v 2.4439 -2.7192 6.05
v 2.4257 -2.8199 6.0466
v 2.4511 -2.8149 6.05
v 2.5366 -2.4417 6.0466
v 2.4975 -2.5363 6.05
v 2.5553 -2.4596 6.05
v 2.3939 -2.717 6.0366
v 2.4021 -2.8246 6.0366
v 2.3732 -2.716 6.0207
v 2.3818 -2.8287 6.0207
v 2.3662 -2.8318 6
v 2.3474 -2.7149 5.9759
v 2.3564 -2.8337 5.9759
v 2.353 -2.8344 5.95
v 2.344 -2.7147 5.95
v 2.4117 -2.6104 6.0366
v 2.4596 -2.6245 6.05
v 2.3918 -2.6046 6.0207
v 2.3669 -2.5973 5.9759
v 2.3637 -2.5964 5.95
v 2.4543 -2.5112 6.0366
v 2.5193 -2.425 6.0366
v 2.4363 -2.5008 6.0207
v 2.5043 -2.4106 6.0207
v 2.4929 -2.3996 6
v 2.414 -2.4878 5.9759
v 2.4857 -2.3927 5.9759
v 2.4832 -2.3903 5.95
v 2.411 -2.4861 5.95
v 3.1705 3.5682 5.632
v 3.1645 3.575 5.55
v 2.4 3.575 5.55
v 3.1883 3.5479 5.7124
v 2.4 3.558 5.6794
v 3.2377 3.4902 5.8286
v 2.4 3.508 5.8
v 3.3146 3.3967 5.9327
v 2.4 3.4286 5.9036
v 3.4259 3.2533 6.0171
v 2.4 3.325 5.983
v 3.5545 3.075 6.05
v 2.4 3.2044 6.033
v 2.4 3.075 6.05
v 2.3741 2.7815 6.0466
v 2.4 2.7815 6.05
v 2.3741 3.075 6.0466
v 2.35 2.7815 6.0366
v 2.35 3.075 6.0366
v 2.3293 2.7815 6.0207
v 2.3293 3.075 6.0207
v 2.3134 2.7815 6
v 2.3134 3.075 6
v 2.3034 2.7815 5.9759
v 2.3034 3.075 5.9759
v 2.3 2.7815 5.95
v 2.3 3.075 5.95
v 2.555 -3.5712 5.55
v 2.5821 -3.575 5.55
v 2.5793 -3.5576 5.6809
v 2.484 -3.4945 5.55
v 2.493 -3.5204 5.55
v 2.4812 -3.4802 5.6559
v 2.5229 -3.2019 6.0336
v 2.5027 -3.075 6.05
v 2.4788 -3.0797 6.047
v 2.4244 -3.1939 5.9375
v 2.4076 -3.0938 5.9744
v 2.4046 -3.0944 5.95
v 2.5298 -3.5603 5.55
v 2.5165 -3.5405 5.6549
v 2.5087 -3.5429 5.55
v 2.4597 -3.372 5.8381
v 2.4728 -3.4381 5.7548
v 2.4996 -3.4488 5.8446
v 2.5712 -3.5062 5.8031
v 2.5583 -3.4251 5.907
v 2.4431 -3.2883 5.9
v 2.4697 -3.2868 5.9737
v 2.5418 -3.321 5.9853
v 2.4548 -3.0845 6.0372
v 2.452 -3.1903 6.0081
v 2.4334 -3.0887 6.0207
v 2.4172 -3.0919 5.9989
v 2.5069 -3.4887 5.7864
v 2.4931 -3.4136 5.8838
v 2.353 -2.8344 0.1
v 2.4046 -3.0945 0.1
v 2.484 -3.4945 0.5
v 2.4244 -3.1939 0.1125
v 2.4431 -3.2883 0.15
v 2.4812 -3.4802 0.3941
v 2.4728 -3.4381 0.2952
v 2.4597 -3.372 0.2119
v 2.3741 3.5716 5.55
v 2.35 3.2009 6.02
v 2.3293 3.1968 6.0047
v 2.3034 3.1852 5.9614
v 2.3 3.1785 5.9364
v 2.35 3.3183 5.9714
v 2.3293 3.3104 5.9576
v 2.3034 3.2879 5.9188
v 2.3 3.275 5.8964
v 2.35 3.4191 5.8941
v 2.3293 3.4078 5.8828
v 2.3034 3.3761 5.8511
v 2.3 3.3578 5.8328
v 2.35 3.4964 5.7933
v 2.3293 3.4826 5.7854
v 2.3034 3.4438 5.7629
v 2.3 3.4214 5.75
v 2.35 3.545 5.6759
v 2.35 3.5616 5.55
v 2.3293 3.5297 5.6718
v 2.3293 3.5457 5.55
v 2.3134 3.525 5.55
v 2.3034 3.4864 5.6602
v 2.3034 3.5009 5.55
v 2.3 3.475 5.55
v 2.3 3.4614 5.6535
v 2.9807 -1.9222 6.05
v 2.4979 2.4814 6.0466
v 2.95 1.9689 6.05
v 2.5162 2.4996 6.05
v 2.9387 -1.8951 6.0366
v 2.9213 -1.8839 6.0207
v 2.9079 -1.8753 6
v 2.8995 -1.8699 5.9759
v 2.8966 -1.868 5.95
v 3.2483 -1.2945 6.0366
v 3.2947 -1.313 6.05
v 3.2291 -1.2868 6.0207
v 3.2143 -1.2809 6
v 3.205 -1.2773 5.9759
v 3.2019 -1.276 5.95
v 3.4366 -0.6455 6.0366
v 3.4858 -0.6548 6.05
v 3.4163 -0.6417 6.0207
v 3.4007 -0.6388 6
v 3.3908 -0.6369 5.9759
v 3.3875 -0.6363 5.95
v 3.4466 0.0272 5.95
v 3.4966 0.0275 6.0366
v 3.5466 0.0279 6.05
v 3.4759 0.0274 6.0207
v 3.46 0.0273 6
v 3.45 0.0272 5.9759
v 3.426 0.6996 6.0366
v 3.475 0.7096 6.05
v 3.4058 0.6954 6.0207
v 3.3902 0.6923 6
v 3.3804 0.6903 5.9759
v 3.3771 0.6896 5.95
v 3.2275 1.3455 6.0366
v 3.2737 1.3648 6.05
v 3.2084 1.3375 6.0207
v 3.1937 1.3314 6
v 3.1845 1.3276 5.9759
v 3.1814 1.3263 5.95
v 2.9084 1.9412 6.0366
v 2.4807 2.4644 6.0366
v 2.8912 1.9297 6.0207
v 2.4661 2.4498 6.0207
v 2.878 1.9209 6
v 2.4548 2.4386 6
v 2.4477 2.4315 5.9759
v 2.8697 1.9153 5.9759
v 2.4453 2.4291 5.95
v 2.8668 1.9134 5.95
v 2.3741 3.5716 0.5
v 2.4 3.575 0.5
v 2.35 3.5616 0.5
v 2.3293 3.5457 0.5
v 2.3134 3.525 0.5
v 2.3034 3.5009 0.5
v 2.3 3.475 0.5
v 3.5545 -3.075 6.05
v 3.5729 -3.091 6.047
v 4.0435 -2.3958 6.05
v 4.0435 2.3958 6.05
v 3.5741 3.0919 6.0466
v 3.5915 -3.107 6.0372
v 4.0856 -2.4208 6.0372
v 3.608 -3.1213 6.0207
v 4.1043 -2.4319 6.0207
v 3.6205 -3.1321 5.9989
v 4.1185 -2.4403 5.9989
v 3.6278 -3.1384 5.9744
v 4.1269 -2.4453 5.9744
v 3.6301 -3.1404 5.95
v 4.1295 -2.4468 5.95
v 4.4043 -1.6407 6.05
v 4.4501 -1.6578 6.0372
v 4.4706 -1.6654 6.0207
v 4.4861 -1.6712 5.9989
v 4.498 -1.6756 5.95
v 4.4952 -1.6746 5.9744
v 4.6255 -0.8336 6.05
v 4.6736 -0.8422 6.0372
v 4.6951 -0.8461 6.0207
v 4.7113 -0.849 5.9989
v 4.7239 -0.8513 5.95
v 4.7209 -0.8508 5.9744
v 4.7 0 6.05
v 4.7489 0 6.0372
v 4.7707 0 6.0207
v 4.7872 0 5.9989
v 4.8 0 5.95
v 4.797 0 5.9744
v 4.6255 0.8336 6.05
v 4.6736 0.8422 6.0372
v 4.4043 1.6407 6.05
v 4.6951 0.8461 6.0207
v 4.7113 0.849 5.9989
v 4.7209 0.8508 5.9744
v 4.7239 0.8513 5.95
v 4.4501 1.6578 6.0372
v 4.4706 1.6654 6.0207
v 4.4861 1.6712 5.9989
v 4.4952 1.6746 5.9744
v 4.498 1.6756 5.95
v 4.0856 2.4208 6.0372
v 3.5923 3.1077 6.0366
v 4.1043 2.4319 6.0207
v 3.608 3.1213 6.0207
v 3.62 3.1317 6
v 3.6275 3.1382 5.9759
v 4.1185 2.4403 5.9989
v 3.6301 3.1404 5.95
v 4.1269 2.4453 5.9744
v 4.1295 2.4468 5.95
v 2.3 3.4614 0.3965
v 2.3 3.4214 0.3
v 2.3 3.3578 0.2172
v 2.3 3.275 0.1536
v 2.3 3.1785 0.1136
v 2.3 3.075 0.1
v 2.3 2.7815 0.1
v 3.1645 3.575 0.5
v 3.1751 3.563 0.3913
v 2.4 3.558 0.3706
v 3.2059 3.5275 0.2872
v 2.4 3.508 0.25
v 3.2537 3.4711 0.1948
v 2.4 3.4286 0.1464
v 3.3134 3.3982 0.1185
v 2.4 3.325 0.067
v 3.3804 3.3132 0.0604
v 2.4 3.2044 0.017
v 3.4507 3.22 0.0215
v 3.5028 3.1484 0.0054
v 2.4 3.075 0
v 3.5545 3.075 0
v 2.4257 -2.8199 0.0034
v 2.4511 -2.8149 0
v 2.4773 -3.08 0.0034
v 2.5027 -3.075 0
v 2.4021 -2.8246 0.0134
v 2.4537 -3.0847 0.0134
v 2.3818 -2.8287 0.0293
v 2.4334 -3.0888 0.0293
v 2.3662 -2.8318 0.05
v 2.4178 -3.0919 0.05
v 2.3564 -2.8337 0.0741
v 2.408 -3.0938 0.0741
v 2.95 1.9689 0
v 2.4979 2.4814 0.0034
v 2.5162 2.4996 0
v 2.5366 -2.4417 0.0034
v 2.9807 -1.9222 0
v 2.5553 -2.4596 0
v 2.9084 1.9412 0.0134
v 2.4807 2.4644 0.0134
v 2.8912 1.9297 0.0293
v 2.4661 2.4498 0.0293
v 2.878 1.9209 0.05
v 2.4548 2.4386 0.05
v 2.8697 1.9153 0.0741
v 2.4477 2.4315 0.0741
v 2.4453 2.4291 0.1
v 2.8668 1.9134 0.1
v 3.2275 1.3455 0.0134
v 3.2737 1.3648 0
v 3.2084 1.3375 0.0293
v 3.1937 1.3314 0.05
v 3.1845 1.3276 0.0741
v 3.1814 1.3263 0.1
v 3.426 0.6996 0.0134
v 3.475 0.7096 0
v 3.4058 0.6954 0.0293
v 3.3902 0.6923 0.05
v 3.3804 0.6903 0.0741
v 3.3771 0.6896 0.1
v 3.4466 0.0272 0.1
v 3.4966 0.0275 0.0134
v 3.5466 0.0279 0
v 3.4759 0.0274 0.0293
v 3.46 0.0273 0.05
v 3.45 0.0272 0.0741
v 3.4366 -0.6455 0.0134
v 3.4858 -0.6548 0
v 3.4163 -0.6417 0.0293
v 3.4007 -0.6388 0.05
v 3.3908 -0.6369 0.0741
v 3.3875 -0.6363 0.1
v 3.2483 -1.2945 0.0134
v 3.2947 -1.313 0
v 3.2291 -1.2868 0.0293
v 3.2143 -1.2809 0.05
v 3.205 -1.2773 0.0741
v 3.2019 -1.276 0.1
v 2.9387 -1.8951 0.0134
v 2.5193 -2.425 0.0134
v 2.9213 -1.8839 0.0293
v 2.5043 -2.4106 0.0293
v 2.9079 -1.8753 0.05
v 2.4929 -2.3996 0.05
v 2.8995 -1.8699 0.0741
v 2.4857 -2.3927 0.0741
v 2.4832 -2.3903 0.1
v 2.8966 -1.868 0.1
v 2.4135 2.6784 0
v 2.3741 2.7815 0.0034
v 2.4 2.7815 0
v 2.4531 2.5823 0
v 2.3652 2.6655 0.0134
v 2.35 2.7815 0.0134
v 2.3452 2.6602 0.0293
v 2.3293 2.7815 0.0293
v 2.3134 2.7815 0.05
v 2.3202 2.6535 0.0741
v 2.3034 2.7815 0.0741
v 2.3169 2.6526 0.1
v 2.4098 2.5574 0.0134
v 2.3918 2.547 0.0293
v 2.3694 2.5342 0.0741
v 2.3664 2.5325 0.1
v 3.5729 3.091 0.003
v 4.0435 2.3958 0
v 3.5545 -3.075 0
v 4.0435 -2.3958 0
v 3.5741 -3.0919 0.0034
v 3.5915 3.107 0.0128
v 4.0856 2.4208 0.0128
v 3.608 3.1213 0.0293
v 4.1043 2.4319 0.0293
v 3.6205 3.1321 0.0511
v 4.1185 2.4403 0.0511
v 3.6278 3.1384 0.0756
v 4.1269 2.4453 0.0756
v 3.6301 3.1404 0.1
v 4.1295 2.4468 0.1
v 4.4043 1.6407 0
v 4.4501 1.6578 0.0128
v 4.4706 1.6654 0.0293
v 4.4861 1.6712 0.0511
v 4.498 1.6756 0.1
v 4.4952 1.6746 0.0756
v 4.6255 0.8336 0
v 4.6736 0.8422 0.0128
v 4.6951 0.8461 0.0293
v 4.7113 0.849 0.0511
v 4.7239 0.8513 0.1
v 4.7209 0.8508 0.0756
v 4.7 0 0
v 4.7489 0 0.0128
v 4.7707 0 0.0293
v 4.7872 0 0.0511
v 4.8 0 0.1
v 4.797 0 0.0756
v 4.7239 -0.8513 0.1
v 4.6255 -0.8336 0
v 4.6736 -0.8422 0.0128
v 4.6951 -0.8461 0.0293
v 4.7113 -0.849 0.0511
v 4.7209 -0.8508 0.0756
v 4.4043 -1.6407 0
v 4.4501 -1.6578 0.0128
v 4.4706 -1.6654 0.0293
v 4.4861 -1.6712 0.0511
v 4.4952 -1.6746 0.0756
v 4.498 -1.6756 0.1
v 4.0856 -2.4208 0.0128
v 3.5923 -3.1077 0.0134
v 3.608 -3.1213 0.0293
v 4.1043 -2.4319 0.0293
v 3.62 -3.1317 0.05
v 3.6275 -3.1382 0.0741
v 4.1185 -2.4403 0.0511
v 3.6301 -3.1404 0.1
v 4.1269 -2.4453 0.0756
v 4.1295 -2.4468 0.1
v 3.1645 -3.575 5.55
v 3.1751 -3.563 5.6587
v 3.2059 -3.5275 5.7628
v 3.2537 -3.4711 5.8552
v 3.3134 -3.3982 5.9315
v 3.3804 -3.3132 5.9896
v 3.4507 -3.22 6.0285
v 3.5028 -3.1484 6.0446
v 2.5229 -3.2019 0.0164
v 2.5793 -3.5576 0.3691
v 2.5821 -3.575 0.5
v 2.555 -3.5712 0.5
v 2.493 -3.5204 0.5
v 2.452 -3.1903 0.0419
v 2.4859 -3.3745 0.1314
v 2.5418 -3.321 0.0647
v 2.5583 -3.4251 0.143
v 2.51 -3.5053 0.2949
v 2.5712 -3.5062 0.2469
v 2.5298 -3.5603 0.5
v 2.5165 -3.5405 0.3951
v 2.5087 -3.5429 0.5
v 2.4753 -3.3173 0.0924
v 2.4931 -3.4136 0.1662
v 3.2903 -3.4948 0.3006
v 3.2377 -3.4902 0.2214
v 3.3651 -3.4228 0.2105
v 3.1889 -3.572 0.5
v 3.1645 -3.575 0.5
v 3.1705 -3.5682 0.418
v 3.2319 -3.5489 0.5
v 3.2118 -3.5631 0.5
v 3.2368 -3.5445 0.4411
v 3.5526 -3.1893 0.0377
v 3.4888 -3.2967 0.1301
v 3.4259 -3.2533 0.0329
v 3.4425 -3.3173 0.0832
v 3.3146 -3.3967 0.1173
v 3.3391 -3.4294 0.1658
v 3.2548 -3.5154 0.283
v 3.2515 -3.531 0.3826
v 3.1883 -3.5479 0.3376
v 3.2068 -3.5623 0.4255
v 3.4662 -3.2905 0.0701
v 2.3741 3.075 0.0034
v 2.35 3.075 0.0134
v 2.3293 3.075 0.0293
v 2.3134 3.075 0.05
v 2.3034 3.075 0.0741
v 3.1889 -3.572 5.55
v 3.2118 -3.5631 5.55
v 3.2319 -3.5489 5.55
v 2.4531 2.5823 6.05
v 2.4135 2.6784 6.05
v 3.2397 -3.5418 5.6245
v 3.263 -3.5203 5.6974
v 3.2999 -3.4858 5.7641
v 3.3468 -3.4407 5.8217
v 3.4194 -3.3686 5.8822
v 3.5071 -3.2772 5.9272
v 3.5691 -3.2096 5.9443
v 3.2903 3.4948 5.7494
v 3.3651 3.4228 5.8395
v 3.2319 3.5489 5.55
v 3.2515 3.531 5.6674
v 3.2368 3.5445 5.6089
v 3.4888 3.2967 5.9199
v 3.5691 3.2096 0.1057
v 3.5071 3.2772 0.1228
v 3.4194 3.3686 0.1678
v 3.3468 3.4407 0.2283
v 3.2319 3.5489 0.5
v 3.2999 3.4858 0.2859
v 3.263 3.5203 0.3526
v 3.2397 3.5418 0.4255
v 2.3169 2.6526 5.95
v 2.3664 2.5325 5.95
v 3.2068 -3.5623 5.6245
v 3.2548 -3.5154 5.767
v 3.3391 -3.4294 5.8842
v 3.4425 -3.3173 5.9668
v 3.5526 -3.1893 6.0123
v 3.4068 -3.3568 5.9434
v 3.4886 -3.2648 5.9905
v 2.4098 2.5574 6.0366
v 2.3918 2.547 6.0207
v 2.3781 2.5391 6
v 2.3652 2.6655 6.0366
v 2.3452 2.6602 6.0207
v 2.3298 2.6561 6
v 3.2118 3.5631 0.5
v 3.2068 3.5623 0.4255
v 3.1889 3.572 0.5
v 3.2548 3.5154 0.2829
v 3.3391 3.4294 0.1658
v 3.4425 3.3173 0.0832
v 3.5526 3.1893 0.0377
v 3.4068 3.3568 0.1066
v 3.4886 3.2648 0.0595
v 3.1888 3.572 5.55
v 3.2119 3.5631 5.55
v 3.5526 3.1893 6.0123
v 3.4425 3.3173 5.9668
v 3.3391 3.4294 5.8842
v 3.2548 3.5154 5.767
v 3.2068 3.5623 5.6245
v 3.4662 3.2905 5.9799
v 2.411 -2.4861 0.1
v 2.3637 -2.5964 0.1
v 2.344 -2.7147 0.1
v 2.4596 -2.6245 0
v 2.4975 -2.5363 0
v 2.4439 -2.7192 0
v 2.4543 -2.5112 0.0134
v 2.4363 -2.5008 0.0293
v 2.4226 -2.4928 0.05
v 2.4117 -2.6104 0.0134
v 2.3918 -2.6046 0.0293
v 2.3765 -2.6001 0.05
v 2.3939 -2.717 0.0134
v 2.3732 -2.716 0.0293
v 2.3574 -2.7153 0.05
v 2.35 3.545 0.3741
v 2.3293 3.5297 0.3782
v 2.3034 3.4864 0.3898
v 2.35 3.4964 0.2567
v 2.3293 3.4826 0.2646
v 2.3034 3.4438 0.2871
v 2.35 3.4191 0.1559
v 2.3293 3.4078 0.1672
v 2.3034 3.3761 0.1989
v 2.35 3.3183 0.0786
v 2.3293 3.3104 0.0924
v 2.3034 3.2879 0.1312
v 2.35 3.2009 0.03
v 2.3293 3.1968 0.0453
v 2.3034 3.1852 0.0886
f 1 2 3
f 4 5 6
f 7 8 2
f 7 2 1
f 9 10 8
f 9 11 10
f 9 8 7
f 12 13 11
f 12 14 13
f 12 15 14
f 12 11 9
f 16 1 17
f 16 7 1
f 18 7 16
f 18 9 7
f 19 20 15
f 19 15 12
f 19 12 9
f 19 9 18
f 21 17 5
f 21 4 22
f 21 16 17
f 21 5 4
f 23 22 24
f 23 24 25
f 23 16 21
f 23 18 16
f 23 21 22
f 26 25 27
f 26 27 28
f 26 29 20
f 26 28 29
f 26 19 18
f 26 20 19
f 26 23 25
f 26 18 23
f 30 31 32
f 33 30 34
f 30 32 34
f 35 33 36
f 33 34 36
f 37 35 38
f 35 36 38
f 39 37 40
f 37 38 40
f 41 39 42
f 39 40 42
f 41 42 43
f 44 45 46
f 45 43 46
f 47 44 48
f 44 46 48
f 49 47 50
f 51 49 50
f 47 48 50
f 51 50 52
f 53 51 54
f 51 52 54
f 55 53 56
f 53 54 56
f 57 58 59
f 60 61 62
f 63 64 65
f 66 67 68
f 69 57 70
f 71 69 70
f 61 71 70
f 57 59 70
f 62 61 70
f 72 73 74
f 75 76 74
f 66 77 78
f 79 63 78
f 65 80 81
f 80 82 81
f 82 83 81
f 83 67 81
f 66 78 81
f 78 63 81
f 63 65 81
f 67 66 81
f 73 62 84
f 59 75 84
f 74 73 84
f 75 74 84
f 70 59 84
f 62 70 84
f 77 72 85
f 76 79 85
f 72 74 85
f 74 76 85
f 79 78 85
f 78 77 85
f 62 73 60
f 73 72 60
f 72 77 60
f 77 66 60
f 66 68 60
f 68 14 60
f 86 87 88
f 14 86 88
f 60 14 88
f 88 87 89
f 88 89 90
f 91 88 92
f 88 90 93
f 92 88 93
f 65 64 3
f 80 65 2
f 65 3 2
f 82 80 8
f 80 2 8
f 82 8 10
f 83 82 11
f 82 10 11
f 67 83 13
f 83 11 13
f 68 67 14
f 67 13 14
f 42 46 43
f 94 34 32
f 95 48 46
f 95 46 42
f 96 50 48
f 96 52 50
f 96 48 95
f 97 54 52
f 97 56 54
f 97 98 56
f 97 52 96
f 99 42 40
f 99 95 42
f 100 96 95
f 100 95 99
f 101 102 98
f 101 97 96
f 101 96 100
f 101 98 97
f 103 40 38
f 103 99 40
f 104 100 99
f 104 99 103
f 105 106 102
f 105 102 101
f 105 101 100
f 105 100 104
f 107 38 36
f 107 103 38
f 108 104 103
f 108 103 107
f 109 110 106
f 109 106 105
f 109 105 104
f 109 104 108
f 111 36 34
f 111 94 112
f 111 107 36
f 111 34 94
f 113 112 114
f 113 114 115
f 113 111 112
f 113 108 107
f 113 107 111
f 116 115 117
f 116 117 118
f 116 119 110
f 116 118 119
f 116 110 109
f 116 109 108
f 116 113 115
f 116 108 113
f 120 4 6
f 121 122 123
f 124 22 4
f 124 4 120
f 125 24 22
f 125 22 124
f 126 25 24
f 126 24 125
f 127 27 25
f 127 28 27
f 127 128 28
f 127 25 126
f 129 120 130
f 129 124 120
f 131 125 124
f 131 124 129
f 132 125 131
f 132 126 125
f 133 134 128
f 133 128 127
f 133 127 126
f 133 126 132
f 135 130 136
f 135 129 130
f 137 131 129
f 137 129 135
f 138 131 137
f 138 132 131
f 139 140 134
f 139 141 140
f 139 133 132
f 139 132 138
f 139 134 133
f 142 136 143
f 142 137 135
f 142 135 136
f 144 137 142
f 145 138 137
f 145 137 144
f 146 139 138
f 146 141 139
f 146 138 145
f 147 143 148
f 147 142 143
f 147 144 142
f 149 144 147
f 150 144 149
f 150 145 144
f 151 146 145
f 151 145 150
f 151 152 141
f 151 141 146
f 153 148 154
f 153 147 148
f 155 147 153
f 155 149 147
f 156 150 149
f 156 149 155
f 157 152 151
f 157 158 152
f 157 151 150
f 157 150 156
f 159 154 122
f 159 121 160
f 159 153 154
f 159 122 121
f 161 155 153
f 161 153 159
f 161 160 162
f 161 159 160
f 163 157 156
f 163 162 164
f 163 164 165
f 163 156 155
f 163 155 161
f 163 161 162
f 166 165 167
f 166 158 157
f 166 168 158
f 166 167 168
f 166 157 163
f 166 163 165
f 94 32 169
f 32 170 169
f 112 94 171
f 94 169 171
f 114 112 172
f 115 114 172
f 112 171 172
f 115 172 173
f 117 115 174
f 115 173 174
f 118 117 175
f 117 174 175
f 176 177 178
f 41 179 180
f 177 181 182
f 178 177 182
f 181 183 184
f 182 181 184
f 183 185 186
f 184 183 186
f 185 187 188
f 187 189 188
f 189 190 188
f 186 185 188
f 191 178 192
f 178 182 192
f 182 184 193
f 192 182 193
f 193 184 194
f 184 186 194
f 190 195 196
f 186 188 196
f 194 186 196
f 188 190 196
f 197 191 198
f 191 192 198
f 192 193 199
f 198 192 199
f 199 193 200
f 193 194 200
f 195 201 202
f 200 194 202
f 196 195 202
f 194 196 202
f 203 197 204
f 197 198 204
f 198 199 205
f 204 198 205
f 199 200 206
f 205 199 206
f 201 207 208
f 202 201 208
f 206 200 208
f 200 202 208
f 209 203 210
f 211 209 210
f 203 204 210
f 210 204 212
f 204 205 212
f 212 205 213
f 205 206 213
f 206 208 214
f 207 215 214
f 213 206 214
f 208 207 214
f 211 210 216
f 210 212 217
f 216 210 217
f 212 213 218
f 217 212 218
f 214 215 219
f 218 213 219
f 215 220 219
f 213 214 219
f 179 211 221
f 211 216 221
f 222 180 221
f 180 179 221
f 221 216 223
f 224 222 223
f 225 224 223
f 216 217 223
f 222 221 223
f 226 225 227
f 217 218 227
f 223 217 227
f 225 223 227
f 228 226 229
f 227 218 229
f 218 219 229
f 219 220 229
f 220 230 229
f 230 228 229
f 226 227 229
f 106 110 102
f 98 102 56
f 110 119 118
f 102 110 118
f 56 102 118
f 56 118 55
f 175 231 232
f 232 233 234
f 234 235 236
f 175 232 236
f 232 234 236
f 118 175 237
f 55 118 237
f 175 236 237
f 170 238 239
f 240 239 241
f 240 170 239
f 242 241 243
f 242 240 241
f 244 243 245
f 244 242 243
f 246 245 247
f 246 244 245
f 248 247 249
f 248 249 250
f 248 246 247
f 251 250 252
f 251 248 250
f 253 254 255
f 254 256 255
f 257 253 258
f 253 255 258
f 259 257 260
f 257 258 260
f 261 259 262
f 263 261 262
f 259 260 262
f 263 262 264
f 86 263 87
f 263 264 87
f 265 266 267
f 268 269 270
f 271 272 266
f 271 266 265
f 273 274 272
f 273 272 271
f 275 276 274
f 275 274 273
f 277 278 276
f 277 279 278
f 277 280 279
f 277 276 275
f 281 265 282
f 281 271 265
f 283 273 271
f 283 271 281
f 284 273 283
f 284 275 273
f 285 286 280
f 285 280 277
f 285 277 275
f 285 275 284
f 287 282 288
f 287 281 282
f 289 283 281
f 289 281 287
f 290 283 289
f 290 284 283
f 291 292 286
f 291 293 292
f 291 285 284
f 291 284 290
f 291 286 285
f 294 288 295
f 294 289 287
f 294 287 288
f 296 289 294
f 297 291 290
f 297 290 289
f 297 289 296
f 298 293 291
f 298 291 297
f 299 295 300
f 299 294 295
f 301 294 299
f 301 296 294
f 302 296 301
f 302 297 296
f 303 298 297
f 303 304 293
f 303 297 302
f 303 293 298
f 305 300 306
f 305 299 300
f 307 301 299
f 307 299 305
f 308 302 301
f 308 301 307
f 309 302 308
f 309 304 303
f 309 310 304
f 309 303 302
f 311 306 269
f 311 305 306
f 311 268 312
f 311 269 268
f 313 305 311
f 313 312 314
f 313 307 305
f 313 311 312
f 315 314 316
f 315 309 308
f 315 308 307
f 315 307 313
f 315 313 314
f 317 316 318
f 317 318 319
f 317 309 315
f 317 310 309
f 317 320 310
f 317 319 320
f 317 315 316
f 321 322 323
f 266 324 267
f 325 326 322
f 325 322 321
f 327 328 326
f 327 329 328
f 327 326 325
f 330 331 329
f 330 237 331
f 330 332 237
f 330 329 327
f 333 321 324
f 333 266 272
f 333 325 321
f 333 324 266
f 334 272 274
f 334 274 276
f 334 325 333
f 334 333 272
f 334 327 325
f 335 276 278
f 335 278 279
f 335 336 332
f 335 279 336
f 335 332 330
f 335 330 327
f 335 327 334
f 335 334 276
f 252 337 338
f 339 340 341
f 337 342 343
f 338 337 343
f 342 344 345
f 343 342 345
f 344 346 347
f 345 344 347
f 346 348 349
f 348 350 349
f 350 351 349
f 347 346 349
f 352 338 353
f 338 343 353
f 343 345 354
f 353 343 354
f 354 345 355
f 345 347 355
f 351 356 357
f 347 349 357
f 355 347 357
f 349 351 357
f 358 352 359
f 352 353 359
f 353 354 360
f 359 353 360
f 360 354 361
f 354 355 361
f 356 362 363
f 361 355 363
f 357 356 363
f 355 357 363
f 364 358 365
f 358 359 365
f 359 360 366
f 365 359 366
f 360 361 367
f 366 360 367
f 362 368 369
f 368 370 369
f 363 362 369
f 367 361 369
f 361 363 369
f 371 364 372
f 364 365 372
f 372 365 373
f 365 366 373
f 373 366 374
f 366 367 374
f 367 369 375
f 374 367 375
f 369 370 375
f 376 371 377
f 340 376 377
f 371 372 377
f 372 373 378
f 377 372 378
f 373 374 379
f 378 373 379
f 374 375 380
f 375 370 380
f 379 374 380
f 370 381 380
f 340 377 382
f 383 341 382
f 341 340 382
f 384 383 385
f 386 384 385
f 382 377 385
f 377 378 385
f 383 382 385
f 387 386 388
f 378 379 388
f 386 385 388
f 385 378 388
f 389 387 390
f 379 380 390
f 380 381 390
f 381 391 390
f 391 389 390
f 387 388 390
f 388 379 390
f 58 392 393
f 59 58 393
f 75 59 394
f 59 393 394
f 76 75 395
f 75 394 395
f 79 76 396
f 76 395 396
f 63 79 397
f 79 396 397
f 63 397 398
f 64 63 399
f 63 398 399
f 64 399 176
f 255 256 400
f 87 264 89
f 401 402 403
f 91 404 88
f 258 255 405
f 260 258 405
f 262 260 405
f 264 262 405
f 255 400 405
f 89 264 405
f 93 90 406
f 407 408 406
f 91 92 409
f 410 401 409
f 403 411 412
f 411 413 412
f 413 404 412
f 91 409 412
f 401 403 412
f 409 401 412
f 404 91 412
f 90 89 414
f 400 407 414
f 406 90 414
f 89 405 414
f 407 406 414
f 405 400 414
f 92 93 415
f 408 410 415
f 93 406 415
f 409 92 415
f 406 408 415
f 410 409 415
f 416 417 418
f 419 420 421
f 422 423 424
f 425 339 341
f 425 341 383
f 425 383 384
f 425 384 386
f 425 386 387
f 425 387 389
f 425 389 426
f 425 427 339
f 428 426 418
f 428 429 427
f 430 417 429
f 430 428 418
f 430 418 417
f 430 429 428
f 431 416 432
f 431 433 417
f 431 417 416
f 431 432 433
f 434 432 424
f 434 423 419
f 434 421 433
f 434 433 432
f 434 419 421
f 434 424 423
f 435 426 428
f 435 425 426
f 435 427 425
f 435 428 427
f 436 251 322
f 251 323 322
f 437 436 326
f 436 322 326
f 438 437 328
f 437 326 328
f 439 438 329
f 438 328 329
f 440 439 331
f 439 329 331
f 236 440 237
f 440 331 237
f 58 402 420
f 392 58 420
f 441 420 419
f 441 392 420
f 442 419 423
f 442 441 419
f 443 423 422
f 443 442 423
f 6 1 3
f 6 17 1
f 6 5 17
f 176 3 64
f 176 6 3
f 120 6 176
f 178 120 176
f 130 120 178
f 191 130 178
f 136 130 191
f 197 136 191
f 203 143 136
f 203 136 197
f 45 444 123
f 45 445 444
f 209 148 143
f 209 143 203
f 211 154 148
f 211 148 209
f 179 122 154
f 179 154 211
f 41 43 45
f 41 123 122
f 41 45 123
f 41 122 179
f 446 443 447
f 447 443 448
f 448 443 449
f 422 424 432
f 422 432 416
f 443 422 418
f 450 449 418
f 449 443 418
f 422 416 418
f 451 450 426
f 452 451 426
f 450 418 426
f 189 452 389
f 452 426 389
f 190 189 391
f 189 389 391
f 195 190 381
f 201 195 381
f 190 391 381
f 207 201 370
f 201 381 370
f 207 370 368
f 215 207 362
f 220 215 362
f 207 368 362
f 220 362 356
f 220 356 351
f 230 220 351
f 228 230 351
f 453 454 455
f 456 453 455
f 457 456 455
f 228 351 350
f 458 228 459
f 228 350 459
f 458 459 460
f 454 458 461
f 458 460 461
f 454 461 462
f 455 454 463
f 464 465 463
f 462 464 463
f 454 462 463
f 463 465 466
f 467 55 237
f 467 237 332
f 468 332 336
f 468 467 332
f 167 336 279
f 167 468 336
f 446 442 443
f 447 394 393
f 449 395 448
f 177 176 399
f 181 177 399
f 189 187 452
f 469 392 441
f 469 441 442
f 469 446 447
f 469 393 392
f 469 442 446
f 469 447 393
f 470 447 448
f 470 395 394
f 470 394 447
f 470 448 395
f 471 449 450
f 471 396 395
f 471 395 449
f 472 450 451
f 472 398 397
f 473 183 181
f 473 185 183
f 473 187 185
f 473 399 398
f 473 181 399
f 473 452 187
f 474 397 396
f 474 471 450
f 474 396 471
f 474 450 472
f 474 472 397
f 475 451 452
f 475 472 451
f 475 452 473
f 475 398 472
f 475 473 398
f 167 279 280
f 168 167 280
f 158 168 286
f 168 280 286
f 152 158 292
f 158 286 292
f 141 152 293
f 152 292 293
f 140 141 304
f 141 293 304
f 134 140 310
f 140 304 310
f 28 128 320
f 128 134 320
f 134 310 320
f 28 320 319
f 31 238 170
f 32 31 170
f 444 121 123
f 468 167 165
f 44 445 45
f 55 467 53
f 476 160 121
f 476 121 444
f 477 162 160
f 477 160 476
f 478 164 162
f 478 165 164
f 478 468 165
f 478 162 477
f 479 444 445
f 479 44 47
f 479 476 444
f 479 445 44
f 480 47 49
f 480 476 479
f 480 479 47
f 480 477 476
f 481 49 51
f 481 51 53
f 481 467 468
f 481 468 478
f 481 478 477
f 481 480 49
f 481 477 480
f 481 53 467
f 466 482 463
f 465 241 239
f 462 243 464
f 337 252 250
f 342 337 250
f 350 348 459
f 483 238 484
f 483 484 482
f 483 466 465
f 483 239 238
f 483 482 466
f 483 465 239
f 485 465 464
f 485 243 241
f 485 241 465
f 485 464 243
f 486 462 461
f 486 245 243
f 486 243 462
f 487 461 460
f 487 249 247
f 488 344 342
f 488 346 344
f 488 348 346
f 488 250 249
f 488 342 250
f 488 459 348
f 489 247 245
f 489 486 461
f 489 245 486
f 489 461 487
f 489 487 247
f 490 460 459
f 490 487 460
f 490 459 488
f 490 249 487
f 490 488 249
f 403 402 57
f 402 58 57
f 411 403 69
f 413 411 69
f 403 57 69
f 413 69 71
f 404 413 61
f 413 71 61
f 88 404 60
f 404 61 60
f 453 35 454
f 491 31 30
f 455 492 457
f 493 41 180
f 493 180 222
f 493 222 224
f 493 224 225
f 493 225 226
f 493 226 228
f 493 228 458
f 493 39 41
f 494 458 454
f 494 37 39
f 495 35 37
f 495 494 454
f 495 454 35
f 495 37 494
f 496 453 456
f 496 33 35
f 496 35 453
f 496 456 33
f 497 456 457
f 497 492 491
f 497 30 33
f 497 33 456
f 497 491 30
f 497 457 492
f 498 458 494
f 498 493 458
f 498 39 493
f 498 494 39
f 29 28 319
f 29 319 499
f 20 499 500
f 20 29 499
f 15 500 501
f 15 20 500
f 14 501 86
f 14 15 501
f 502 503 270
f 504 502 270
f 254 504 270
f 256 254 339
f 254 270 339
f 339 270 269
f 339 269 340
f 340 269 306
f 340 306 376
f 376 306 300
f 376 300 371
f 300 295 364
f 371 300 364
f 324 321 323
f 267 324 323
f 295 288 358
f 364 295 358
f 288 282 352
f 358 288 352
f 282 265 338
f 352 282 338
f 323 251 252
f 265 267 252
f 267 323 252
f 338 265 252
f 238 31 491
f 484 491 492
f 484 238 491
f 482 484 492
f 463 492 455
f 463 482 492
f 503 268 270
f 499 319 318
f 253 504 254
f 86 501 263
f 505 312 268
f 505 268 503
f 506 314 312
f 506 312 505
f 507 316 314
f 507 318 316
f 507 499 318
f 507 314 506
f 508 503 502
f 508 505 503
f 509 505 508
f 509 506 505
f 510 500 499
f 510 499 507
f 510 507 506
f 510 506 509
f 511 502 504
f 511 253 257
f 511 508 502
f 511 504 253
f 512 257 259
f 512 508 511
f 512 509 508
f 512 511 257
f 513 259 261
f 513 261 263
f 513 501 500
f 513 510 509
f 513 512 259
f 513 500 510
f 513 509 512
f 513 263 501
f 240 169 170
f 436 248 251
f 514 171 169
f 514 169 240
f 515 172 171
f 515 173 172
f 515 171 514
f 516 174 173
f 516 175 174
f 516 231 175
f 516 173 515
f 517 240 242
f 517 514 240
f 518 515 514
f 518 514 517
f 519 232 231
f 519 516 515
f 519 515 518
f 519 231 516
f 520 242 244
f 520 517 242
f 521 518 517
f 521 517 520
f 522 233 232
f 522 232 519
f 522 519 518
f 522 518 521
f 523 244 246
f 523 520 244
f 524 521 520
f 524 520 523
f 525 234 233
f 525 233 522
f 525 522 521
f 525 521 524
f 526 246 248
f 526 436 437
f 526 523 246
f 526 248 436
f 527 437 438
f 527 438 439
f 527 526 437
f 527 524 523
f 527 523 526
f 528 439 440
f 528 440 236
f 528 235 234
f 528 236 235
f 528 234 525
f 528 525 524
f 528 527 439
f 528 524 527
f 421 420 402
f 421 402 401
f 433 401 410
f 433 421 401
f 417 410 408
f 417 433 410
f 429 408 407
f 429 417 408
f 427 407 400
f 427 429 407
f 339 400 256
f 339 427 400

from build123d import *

# Parameters (mm, degrees)
BOSS_EXTRUDE1_DEPTH = 6.05
FILLET1_R           = 0.5
FILLET2_R           = 0.1


with BuildPart() as part:
    # Sketch1 → Boss-Extrude1 (new body)
    with BuildSketch(Plane.XY):
        with BuildLine():
            Line((2.5, -3.575), (3.203025913, -3.575))
            ThreePointArc((3.203025913, -3.575), (4.8, 0), (3.203025913, 3.575))
            Line((3.203025913, 3.575), (2.3, 3.575))
            Line((2.3, 3.575), (2.3, 2.567103802))
            ThreePointArc((2.3, 2.567103802), (3.446740769, 0), (2.3, -2.567103802))
            Line((2.3, -2.567103802), (2.5, -3.575))
        make_face()
    extrude(amount=BOSS_EXTRUDE1_DEPTH)

    # Fillet1
    fillet1_edges = [part.edges().sort_by_distance(p)[0] for p in [
        (2.751512957, 3.575, 0),
        (2.3, 2.567103802, 3.025),
        (2.3, -2.567103802, 3.025),
        (2.851512957, -3.575, 0),
        (2.851512957, -3.575, 6.05),
        (2.751512957, 3.575, 6.05),
    ]]
    fillet(fillet1_edges, radius=FILLET1_R)

    # Fillet2
    fillet2_edges = [part.edges().sort_by_distance(p)[0] for p in [
        (2.5, -3.575, 3.025),
        (3.203025913, -3.575, 3.025),
        (4.8, 0, 6.05),
        (4.8, 0, 0),
        (3.203025913, 3.575, 3.025),
        (3.383378785, 3.40481248, 5.925797449),
        (3.383378785, 3.40481248, 0.124202551),
        (3.383378797, -3.404812467, 5.92579746),
        (3.383378797, -3.404812467, 0.12420254),
        (2.376908676, -2.954683613, 0),
        (3.446633835, 0.027150287, 0),
        (2.3, 2.928251838, 0),
        (2.337743829, 2.590927621, 0),
        (2.363671694, -2.596363527, 0),
        (2.376908676, -2.954683613, 6.05),
        (2.470600688, -3.426842727, 5.905255817),
        (2.470600688, -3.426842727, 0.144744183),
        (2.3, 2.928251838, 6.05),
        (3.446633835, 0.027150287, 6.05),
        (2.337743829, 2.590927621, 6.05),
        (2.363671694, -2.596363527, 6.05),
        (2.3, 3.575, 3.025),
        (2.3, 3.428553391, 5.903553391),
        (2.3, 3.428553391, 0.146446609),
    ]]
    fillet(fillet2_edges, radius=FILLET2_R)


solid = part.part
